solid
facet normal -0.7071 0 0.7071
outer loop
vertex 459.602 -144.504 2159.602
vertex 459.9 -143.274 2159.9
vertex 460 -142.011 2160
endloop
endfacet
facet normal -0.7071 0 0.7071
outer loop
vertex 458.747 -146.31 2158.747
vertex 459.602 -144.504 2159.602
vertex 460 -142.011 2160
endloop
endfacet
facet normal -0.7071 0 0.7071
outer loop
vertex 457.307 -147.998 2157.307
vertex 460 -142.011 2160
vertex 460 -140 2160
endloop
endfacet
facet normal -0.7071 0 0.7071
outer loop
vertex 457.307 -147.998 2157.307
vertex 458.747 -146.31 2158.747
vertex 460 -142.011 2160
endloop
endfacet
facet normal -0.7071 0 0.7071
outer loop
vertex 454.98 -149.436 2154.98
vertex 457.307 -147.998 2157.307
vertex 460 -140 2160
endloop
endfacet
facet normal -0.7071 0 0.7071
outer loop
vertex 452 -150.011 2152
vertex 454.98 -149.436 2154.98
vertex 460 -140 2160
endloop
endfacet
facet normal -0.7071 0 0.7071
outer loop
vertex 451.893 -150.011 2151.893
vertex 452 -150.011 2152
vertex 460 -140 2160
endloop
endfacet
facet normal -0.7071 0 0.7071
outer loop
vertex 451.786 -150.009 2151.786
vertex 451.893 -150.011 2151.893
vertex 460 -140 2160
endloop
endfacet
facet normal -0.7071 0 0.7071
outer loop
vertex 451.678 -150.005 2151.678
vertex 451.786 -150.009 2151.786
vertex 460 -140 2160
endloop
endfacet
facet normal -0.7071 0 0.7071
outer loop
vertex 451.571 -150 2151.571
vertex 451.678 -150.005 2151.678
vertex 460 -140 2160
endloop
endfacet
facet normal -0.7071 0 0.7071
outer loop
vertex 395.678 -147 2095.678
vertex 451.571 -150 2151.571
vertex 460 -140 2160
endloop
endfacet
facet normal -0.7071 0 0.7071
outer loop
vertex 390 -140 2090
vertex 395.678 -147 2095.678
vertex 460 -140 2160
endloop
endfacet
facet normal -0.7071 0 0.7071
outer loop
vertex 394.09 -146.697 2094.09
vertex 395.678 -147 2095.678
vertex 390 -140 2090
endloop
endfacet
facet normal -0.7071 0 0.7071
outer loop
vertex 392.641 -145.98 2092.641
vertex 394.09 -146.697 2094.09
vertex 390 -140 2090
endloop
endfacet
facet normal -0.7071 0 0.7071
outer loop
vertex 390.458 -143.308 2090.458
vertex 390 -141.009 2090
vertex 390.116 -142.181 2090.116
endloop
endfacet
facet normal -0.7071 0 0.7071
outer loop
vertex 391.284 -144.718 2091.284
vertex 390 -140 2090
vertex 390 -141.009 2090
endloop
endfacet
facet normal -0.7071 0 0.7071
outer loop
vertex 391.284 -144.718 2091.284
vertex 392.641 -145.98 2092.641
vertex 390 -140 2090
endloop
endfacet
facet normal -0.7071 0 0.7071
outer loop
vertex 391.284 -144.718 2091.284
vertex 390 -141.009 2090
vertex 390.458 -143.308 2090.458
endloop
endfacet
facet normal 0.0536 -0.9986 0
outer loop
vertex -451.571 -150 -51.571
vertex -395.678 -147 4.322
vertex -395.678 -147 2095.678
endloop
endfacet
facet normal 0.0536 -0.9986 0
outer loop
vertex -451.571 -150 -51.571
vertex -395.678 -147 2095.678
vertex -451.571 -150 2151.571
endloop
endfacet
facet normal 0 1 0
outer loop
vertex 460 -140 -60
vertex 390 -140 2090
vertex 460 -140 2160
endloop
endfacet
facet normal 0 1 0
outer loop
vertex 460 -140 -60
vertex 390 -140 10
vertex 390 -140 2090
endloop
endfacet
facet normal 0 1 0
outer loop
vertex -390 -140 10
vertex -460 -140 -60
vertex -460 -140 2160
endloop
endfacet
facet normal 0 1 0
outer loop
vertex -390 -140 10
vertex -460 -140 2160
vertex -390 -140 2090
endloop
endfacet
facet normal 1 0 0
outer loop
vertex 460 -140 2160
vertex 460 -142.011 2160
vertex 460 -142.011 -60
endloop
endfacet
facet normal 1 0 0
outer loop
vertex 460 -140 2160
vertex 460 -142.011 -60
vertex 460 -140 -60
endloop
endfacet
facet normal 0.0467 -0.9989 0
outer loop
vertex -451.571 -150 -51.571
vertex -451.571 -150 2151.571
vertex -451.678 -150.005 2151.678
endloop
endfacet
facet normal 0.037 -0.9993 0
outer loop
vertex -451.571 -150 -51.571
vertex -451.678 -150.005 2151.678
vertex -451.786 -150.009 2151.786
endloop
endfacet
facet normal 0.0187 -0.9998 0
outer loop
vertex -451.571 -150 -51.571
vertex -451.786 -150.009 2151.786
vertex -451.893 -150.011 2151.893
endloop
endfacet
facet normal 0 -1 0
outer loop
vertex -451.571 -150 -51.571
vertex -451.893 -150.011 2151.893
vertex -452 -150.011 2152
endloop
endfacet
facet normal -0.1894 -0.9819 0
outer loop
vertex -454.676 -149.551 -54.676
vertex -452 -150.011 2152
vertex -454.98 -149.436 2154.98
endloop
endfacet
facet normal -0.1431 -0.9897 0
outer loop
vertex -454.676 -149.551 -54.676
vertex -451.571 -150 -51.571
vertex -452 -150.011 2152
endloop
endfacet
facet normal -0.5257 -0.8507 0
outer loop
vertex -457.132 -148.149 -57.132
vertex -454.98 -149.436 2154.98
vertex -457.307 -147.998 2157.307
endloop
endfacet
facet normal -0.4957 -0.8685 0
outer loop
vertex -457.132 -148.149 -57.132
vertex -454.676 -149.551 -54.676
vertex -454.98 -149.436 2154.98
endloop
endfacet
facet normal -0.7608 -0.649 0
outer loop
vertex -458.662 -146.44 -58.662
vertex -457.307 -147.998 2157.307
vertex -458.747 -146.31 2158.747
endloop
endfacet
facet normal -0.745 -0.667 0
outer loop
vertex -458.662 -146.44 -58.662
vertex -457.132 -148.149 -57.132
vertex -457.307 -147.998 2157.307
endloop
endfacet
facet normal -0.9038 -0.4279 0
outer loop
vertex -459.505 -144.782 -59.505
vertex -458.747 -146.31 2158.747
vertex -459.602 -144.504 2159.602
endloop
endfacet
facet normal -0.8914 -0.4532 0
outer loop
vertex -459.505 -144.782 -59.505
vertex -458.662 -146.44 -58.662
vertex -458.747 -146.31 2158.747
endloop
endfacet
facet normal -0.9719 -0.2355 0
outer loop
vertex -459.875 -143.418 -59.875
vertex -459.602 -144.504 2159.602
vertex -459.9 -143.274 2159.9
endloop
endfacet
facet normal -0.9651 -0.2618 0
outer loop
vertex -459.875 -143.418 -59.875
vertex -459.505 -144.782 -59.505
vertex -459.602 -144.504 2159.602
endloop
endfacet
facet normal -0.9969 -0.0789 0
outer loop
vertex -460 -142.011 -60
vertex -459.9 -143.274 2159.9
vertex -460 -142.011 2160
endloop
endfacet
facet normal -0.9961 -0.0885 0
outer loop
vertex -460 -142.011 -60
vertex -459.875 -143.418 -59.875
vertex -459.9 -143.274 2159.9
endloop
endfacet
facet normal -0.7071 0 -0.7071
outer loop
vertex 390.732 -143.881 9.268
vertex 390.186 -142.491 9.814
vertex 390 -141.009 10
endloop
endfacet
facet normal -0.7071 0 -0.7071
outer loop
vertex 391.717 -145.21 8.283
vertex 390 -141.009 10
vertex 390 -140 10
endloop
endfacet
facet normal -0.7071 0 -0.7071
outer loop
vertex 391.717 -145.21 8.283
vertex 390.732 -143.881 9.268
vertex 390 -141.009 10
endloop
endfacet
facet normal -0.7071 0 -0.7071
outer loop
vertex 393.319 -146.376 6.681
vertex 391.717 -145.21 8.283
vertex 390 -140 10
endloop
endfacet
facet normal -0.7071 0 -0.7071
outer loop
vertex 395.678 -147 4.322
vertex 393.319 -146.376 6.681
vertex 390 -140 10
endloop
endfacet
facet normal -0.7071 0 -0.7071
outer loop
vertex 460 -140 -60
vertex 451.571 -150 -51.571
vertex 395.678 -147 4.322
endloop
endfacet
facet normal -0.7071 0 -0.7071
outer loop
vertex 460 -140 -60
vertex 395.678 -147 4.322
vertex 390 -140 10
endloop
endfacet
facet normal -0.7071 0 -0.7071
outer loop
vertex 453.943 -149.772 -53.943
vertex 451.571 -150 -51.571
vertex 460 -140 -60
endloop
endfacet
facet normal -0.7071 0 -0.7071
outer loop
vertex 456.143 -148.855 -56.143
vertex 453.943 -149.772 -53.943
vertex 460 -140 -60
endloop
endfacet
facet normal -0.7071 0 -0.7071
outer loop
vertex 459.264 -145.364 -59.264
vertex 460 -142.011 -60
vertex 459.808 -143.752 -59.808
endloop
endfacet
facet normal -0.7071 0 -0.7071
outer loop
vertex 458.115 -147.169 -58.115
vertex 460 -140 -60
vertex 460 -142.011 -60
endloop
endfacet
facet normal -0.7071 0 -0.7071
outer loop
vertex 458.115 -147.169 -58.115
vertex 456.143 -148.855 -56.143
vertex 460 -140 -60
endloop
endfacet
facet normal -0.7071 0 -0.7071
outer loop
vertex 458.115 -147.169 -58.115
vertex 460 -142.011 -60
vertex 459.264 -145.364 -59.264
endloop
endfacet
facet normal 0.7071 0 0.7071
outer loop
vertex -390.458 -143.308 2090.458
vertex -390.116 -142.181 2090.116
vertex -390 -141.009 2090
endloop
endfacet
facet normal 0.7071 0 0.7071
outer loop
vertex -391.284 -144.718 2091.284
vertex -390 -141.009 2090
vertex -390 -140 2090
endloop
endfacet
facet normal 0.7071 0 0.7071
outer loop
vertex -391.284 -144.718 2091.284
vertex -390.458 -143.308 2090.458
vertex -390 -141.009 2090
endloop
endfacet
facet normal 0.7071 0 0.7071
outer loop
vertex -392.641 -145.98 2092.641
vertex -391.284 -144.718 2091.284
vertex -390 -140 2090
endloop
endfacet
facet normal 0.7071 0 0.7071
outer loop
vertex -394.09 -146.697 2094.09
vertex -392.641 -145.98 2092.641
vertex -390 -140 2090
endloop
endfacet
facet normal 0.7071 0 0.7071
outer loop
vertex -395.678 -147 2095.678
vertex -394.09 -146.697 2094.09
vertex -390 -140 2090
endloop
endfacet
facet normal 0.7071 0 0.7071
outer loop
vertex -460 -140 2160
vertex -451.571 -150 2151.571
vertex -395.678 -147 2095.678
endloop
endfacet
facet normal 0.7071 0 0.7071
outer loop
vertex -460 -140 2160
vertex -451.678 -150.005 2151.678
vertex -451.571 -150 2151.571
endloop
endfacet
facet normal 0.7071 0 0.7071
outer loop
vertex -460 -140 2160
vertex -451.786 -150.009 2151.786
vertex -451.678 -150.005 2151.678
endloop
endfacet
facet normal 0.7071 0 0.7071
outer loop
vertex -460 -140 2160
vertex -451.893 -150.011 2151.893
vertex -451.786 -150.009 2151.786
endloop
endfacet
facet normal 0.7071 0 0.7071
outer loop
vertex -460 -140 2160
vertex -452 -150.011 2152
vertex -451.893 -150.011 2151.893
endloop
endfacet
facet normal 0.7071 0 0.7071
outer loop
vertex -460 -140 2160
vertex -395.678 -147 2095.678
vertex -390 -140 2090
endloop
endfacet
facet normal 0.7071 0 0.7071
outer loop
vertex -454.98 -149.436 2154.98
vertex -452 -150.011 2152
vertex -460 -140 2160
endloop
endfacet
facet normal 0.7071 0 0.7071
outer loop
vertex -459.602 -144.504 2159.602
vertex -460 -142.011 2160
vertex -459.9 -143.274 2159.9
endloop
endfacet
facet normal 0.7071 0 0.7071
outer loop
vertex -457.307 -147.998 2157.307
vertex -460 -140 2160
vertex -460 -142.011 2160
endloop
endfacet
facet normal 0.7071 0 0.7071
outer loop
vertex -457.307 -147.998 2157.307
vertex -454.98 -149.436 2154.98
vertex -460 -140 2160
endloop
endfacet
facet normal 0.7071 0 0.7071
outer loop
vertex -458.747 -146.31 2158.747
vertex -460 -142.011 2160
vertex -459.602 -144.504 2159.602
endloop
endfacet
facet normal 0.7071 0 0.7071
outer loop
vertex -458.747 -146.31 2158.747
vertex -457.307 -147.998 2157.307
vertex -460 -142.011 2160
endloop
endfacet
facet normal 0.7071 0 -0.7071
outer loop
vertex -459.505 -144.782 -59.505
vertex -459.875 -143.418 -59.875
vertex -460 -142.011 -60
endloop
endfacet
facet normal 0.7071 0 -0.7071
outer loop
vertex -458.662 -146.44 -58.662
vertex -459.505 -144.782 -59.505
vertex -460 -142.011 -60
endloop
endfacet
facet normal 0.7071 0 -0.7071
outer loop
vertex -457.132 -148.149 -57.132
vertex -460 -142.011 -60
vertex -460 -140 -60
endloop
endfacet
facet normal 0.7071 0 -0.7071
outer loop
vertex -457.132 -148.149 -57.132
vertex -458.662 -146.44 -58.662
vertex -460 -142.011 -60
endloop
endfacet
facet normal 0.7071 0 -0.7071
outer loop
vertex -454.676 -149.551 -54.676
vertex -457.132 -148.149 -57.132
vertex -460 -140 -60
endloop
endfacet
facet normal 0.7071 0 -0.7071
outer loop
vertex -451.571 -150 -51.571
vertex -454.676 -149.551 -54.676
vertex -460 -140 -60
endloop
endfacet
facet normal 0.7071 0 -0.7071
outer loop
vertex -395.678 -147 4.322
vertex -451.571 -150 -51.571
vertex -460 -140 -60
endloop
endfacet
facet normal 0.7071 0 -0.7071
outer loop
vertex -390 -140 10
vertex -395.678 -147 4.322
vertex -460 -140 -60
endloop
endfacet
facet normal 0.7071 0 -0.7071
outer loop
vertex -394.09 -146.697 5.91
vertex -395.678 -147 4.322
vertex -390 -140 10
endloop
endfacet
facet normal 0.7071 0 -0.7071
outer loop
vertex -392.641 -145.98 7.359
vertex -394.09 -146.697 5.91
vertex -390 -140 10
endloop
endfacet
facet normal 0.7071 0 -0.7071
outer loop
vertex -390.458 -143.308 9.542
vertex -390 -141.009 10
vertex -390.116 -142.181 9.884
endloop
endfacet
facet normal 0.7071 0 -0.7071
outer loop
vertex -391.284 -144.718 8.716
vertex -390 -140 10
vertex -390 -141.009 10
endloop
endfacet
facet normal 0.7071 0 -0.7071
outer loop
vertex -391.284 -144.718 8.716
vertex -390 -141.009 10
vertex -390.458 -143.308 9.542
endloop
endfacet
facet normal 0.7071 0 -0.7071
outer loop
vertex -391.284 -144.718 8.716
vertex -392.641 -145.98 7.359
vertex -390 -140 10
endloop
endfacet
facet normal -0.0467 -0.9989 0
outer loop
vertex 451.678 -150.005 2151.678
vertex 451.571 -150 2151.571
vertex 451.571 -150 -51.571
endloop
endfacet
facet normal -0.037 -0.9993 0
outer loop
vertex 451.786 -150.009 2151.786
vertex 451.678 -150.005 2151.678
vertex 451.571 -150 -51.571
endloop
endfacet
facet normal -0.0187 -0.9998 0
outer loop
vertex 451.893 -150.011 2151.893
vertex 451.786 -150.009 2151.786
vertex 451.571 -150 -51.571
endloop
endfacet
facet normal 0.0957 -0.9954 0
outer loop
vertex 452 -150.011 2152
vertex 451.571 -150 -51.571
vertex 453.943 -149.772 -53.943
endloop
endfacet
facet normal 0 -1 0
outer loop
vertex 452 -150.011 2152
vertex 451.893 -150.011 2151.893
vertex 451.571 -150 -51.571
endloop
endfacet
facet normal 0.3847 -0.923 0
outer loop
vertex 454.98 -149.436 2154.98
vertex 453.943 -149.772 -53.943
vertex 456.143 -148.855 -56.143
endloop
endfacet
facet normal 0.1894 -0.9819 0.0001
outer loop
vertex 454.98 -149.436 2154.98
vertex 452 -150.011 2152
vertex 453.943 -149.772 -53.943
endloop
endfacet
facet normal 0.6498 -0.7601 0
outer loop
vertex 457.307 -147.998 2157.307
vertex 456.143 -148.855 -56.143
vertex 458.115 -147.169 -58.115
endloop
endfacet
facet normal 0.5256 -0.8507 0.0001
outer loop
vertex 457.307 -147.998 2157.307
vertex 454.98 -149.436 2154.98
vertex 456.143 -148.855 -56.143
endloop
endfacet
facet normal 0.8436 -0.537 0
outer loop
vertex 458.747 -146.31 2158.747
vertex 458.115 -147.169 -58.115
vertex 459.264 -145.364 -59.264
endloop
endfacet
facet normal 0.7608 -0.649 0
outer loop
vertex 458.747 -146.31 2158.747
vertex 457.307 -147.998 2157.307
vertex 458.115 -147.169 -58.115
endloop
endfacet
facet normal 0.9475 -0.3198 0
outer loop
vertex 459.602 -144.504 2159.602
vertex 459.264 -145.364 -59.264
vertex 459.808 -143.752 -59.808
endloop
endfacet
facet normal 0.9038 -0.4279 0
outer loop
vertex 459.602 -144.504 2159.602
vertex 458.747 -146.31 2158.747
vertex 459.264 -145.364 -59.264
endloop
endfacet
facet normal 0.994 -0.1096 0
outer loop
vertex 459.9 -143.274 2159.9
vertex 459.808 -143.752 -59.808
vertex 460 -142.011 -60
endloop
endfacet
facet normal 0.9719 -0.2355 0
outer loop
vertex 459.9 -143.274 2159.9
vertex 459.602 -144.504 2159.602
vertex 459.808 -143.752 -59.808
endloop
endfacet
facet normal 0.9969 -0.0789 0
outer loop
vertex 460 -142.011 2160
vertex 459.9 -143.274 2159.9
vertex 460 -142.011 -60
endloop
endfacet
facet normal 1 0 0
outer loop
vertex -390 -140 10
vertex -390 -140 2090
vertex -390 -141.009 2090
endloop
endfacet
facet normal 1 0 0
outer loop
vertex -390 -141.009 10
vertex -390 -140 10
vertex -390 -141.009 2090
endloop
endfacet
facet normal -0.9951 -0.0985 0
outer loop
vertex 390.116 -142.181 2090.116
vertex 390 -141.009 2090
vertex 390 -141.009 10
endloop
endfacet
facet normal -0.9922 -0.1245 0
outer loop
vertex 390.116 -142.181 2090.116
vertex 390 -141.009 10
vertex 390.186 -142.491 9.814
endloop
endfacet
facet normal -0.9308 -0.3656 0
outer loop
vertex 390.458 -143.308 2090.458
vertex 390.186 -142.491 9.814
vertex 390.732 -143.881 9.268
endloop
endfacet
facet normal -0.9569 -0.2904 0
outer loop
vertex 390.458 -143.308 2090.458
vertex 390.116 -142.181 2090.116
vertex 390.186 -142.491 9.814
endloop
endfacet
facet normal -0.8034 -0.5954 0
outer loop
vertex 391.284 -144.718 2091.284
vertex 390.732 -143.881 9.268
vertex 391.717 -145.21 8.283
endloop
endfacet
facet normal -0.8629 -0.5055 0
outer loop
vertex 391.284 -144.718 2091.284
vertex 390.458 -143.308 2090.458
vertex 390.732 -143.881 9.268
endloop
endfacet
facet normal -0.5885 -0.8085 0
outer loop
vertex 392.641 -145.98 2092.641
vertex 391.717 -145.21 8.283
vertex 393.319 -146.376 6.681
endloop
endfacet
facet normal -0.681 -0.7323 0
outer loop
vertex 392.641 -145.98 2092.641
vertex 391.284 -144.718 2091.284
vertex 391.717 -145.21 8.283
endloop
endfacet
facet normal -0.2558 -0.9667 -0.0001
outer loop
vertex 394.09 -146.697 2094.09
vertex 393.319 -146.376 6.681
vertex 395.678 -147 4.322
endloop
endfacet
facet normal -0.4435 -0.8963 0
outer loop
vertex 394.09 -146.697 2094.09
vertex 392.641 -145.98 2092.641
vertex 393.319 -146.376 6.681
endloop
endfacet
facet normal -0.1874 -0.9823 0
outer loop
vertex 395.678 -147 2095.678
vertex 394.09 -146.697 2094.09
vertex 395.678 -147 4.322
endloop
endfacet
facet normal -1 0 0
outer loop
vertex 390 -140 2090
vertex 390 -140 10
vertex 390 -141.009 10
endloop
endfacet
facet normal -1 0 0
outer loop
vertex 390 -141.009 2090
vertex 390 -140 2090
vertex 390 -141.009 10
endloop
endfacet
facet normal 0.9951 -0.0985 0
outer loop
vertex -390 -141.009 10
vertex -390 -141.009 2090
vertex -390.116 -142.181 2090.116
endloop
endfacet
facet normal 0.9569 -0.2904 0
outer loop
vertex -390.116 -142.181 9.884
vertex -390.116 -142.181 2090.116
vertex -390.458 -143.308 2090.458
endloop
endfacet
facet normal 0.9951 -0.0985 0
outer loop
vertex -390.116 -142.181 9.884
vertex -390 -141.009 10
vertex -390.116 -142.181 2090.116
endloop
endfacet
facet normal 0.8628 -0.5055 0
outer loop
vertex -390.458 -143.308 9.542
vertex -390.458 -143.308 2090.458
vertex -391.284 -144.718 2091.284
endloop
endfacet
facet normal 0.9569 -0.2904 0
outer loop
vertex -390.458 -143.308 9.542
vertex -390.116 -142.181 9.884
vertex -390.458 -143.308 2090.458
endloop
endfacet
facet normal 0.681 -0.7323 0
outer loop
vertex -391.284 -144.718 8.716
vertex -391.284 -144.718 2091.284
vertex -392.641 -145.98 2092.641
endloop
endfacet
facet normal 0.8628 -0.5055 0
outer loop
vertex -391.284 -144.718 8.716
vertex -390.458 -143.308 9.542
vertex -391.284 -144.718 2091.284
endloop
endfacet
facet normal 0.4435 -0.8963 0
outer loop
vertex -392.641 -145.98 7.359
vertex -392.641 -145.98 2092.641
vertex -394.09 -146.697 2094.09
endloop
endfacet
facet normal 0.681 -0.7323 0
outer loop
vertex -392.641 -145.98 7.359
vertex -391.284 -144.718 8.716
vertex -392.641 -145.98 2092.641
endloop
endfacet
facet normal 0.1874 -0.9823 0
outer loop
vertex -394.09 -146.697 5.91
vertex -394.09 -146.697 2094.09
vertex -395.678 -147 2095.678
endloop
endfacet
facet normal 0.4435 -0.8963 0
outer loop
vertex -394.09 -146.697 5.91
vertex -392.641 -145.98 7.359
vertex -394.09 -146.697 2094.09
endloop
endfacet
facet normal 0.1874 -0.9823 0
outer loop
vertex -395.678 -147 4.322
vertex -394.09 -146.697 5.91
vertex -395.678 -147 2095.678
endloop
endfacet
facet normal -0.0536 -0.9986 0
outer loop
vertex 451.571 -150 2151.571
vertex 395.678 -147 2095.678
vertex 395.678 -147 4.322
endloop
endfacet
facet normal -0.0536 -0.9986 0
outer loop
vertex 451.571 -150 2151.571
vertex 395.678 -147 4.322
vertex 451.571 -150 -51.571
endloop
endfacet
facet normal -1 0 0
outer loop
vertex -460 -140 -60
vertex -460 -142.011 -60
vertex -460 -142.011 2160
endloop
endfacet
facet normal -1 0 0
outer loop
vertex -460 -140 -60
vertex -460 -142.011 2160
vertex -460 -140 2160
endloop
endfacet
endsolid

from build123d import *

# Parameters (mm, degrees)
EXTRUDE039436_DEPTH = 500
EXTRUDE039434_DEPTH = 500


with BuildPart() as extrude039436_internal_inferior:
    # Sketch225 (on Sketch) → Extrude039436 (new body, symmetric)
    with BuildSketch(Plane.XZ):
        Polygon((-200, 200), (200, 200), (600, -200), (-600, -200), align=None)
    extrude(amount=EXTRUDE039436_DEPTH, both=True)


with BuildPart() as compound051:
    # Sketch223 (on Sketch) → Extrude039434 (new body, symmetric)
    with BuildSketch(Plane.XZ):
        Polygon((-600, 2300), (600, 2300), (200, 1900), (-200, 1900), align=None)
    extrude(amount=EXTRUDE039434_DEPTH, both=True)

    # Compound051: union Extrude039436_internal_inferior_
    add(extrude039436_internal_inferior.part)


with BuildPart() as trim_window_external_vertical:
    # Sweep011: sweep along a path in Sketch194
    with BuildLine(Plane.XZ.offset(140)) as sweep011_path:
        Line((-390, 2090), (-390, 0))
        Line((-390, 0), (390, 0))
        Line((390, 0), (390, 2090))
        Line((390, 2090), (-390, 2090))
    # Clone2D027 (on Sketch) → Sweep011 (sweep)
    with BuildSketch(Plane(origin=(0, -140, 0), x_dir=(0, 0, 1), z_dir=(1, 0, 0))):
        with BuildLine():
            Line((-61.571224, 10), (-5.678418, 7))
            ThreePointArc((-5.678418, 7), (-1.645147, 5.136003), (0, 1.008624))
            Line((0, 1.008624), (0, 0))
            Line((0, 0), (-70, 0))
            Line((-70, 0), (-70, 2.011499))
            ThreePointArc((-70, 2.011499), (-67.503171, 7.81797), (-61.571224, 10))
        make_face()
    sweep(path=sweep011_path.line, is_frenet=True, transition=Transition.RIGHT)

    # Cut076: cut Compound051_
    add(compound051.part, mode=Mode.SUBTRACT)


solid = trim_window_external_vertical.part
